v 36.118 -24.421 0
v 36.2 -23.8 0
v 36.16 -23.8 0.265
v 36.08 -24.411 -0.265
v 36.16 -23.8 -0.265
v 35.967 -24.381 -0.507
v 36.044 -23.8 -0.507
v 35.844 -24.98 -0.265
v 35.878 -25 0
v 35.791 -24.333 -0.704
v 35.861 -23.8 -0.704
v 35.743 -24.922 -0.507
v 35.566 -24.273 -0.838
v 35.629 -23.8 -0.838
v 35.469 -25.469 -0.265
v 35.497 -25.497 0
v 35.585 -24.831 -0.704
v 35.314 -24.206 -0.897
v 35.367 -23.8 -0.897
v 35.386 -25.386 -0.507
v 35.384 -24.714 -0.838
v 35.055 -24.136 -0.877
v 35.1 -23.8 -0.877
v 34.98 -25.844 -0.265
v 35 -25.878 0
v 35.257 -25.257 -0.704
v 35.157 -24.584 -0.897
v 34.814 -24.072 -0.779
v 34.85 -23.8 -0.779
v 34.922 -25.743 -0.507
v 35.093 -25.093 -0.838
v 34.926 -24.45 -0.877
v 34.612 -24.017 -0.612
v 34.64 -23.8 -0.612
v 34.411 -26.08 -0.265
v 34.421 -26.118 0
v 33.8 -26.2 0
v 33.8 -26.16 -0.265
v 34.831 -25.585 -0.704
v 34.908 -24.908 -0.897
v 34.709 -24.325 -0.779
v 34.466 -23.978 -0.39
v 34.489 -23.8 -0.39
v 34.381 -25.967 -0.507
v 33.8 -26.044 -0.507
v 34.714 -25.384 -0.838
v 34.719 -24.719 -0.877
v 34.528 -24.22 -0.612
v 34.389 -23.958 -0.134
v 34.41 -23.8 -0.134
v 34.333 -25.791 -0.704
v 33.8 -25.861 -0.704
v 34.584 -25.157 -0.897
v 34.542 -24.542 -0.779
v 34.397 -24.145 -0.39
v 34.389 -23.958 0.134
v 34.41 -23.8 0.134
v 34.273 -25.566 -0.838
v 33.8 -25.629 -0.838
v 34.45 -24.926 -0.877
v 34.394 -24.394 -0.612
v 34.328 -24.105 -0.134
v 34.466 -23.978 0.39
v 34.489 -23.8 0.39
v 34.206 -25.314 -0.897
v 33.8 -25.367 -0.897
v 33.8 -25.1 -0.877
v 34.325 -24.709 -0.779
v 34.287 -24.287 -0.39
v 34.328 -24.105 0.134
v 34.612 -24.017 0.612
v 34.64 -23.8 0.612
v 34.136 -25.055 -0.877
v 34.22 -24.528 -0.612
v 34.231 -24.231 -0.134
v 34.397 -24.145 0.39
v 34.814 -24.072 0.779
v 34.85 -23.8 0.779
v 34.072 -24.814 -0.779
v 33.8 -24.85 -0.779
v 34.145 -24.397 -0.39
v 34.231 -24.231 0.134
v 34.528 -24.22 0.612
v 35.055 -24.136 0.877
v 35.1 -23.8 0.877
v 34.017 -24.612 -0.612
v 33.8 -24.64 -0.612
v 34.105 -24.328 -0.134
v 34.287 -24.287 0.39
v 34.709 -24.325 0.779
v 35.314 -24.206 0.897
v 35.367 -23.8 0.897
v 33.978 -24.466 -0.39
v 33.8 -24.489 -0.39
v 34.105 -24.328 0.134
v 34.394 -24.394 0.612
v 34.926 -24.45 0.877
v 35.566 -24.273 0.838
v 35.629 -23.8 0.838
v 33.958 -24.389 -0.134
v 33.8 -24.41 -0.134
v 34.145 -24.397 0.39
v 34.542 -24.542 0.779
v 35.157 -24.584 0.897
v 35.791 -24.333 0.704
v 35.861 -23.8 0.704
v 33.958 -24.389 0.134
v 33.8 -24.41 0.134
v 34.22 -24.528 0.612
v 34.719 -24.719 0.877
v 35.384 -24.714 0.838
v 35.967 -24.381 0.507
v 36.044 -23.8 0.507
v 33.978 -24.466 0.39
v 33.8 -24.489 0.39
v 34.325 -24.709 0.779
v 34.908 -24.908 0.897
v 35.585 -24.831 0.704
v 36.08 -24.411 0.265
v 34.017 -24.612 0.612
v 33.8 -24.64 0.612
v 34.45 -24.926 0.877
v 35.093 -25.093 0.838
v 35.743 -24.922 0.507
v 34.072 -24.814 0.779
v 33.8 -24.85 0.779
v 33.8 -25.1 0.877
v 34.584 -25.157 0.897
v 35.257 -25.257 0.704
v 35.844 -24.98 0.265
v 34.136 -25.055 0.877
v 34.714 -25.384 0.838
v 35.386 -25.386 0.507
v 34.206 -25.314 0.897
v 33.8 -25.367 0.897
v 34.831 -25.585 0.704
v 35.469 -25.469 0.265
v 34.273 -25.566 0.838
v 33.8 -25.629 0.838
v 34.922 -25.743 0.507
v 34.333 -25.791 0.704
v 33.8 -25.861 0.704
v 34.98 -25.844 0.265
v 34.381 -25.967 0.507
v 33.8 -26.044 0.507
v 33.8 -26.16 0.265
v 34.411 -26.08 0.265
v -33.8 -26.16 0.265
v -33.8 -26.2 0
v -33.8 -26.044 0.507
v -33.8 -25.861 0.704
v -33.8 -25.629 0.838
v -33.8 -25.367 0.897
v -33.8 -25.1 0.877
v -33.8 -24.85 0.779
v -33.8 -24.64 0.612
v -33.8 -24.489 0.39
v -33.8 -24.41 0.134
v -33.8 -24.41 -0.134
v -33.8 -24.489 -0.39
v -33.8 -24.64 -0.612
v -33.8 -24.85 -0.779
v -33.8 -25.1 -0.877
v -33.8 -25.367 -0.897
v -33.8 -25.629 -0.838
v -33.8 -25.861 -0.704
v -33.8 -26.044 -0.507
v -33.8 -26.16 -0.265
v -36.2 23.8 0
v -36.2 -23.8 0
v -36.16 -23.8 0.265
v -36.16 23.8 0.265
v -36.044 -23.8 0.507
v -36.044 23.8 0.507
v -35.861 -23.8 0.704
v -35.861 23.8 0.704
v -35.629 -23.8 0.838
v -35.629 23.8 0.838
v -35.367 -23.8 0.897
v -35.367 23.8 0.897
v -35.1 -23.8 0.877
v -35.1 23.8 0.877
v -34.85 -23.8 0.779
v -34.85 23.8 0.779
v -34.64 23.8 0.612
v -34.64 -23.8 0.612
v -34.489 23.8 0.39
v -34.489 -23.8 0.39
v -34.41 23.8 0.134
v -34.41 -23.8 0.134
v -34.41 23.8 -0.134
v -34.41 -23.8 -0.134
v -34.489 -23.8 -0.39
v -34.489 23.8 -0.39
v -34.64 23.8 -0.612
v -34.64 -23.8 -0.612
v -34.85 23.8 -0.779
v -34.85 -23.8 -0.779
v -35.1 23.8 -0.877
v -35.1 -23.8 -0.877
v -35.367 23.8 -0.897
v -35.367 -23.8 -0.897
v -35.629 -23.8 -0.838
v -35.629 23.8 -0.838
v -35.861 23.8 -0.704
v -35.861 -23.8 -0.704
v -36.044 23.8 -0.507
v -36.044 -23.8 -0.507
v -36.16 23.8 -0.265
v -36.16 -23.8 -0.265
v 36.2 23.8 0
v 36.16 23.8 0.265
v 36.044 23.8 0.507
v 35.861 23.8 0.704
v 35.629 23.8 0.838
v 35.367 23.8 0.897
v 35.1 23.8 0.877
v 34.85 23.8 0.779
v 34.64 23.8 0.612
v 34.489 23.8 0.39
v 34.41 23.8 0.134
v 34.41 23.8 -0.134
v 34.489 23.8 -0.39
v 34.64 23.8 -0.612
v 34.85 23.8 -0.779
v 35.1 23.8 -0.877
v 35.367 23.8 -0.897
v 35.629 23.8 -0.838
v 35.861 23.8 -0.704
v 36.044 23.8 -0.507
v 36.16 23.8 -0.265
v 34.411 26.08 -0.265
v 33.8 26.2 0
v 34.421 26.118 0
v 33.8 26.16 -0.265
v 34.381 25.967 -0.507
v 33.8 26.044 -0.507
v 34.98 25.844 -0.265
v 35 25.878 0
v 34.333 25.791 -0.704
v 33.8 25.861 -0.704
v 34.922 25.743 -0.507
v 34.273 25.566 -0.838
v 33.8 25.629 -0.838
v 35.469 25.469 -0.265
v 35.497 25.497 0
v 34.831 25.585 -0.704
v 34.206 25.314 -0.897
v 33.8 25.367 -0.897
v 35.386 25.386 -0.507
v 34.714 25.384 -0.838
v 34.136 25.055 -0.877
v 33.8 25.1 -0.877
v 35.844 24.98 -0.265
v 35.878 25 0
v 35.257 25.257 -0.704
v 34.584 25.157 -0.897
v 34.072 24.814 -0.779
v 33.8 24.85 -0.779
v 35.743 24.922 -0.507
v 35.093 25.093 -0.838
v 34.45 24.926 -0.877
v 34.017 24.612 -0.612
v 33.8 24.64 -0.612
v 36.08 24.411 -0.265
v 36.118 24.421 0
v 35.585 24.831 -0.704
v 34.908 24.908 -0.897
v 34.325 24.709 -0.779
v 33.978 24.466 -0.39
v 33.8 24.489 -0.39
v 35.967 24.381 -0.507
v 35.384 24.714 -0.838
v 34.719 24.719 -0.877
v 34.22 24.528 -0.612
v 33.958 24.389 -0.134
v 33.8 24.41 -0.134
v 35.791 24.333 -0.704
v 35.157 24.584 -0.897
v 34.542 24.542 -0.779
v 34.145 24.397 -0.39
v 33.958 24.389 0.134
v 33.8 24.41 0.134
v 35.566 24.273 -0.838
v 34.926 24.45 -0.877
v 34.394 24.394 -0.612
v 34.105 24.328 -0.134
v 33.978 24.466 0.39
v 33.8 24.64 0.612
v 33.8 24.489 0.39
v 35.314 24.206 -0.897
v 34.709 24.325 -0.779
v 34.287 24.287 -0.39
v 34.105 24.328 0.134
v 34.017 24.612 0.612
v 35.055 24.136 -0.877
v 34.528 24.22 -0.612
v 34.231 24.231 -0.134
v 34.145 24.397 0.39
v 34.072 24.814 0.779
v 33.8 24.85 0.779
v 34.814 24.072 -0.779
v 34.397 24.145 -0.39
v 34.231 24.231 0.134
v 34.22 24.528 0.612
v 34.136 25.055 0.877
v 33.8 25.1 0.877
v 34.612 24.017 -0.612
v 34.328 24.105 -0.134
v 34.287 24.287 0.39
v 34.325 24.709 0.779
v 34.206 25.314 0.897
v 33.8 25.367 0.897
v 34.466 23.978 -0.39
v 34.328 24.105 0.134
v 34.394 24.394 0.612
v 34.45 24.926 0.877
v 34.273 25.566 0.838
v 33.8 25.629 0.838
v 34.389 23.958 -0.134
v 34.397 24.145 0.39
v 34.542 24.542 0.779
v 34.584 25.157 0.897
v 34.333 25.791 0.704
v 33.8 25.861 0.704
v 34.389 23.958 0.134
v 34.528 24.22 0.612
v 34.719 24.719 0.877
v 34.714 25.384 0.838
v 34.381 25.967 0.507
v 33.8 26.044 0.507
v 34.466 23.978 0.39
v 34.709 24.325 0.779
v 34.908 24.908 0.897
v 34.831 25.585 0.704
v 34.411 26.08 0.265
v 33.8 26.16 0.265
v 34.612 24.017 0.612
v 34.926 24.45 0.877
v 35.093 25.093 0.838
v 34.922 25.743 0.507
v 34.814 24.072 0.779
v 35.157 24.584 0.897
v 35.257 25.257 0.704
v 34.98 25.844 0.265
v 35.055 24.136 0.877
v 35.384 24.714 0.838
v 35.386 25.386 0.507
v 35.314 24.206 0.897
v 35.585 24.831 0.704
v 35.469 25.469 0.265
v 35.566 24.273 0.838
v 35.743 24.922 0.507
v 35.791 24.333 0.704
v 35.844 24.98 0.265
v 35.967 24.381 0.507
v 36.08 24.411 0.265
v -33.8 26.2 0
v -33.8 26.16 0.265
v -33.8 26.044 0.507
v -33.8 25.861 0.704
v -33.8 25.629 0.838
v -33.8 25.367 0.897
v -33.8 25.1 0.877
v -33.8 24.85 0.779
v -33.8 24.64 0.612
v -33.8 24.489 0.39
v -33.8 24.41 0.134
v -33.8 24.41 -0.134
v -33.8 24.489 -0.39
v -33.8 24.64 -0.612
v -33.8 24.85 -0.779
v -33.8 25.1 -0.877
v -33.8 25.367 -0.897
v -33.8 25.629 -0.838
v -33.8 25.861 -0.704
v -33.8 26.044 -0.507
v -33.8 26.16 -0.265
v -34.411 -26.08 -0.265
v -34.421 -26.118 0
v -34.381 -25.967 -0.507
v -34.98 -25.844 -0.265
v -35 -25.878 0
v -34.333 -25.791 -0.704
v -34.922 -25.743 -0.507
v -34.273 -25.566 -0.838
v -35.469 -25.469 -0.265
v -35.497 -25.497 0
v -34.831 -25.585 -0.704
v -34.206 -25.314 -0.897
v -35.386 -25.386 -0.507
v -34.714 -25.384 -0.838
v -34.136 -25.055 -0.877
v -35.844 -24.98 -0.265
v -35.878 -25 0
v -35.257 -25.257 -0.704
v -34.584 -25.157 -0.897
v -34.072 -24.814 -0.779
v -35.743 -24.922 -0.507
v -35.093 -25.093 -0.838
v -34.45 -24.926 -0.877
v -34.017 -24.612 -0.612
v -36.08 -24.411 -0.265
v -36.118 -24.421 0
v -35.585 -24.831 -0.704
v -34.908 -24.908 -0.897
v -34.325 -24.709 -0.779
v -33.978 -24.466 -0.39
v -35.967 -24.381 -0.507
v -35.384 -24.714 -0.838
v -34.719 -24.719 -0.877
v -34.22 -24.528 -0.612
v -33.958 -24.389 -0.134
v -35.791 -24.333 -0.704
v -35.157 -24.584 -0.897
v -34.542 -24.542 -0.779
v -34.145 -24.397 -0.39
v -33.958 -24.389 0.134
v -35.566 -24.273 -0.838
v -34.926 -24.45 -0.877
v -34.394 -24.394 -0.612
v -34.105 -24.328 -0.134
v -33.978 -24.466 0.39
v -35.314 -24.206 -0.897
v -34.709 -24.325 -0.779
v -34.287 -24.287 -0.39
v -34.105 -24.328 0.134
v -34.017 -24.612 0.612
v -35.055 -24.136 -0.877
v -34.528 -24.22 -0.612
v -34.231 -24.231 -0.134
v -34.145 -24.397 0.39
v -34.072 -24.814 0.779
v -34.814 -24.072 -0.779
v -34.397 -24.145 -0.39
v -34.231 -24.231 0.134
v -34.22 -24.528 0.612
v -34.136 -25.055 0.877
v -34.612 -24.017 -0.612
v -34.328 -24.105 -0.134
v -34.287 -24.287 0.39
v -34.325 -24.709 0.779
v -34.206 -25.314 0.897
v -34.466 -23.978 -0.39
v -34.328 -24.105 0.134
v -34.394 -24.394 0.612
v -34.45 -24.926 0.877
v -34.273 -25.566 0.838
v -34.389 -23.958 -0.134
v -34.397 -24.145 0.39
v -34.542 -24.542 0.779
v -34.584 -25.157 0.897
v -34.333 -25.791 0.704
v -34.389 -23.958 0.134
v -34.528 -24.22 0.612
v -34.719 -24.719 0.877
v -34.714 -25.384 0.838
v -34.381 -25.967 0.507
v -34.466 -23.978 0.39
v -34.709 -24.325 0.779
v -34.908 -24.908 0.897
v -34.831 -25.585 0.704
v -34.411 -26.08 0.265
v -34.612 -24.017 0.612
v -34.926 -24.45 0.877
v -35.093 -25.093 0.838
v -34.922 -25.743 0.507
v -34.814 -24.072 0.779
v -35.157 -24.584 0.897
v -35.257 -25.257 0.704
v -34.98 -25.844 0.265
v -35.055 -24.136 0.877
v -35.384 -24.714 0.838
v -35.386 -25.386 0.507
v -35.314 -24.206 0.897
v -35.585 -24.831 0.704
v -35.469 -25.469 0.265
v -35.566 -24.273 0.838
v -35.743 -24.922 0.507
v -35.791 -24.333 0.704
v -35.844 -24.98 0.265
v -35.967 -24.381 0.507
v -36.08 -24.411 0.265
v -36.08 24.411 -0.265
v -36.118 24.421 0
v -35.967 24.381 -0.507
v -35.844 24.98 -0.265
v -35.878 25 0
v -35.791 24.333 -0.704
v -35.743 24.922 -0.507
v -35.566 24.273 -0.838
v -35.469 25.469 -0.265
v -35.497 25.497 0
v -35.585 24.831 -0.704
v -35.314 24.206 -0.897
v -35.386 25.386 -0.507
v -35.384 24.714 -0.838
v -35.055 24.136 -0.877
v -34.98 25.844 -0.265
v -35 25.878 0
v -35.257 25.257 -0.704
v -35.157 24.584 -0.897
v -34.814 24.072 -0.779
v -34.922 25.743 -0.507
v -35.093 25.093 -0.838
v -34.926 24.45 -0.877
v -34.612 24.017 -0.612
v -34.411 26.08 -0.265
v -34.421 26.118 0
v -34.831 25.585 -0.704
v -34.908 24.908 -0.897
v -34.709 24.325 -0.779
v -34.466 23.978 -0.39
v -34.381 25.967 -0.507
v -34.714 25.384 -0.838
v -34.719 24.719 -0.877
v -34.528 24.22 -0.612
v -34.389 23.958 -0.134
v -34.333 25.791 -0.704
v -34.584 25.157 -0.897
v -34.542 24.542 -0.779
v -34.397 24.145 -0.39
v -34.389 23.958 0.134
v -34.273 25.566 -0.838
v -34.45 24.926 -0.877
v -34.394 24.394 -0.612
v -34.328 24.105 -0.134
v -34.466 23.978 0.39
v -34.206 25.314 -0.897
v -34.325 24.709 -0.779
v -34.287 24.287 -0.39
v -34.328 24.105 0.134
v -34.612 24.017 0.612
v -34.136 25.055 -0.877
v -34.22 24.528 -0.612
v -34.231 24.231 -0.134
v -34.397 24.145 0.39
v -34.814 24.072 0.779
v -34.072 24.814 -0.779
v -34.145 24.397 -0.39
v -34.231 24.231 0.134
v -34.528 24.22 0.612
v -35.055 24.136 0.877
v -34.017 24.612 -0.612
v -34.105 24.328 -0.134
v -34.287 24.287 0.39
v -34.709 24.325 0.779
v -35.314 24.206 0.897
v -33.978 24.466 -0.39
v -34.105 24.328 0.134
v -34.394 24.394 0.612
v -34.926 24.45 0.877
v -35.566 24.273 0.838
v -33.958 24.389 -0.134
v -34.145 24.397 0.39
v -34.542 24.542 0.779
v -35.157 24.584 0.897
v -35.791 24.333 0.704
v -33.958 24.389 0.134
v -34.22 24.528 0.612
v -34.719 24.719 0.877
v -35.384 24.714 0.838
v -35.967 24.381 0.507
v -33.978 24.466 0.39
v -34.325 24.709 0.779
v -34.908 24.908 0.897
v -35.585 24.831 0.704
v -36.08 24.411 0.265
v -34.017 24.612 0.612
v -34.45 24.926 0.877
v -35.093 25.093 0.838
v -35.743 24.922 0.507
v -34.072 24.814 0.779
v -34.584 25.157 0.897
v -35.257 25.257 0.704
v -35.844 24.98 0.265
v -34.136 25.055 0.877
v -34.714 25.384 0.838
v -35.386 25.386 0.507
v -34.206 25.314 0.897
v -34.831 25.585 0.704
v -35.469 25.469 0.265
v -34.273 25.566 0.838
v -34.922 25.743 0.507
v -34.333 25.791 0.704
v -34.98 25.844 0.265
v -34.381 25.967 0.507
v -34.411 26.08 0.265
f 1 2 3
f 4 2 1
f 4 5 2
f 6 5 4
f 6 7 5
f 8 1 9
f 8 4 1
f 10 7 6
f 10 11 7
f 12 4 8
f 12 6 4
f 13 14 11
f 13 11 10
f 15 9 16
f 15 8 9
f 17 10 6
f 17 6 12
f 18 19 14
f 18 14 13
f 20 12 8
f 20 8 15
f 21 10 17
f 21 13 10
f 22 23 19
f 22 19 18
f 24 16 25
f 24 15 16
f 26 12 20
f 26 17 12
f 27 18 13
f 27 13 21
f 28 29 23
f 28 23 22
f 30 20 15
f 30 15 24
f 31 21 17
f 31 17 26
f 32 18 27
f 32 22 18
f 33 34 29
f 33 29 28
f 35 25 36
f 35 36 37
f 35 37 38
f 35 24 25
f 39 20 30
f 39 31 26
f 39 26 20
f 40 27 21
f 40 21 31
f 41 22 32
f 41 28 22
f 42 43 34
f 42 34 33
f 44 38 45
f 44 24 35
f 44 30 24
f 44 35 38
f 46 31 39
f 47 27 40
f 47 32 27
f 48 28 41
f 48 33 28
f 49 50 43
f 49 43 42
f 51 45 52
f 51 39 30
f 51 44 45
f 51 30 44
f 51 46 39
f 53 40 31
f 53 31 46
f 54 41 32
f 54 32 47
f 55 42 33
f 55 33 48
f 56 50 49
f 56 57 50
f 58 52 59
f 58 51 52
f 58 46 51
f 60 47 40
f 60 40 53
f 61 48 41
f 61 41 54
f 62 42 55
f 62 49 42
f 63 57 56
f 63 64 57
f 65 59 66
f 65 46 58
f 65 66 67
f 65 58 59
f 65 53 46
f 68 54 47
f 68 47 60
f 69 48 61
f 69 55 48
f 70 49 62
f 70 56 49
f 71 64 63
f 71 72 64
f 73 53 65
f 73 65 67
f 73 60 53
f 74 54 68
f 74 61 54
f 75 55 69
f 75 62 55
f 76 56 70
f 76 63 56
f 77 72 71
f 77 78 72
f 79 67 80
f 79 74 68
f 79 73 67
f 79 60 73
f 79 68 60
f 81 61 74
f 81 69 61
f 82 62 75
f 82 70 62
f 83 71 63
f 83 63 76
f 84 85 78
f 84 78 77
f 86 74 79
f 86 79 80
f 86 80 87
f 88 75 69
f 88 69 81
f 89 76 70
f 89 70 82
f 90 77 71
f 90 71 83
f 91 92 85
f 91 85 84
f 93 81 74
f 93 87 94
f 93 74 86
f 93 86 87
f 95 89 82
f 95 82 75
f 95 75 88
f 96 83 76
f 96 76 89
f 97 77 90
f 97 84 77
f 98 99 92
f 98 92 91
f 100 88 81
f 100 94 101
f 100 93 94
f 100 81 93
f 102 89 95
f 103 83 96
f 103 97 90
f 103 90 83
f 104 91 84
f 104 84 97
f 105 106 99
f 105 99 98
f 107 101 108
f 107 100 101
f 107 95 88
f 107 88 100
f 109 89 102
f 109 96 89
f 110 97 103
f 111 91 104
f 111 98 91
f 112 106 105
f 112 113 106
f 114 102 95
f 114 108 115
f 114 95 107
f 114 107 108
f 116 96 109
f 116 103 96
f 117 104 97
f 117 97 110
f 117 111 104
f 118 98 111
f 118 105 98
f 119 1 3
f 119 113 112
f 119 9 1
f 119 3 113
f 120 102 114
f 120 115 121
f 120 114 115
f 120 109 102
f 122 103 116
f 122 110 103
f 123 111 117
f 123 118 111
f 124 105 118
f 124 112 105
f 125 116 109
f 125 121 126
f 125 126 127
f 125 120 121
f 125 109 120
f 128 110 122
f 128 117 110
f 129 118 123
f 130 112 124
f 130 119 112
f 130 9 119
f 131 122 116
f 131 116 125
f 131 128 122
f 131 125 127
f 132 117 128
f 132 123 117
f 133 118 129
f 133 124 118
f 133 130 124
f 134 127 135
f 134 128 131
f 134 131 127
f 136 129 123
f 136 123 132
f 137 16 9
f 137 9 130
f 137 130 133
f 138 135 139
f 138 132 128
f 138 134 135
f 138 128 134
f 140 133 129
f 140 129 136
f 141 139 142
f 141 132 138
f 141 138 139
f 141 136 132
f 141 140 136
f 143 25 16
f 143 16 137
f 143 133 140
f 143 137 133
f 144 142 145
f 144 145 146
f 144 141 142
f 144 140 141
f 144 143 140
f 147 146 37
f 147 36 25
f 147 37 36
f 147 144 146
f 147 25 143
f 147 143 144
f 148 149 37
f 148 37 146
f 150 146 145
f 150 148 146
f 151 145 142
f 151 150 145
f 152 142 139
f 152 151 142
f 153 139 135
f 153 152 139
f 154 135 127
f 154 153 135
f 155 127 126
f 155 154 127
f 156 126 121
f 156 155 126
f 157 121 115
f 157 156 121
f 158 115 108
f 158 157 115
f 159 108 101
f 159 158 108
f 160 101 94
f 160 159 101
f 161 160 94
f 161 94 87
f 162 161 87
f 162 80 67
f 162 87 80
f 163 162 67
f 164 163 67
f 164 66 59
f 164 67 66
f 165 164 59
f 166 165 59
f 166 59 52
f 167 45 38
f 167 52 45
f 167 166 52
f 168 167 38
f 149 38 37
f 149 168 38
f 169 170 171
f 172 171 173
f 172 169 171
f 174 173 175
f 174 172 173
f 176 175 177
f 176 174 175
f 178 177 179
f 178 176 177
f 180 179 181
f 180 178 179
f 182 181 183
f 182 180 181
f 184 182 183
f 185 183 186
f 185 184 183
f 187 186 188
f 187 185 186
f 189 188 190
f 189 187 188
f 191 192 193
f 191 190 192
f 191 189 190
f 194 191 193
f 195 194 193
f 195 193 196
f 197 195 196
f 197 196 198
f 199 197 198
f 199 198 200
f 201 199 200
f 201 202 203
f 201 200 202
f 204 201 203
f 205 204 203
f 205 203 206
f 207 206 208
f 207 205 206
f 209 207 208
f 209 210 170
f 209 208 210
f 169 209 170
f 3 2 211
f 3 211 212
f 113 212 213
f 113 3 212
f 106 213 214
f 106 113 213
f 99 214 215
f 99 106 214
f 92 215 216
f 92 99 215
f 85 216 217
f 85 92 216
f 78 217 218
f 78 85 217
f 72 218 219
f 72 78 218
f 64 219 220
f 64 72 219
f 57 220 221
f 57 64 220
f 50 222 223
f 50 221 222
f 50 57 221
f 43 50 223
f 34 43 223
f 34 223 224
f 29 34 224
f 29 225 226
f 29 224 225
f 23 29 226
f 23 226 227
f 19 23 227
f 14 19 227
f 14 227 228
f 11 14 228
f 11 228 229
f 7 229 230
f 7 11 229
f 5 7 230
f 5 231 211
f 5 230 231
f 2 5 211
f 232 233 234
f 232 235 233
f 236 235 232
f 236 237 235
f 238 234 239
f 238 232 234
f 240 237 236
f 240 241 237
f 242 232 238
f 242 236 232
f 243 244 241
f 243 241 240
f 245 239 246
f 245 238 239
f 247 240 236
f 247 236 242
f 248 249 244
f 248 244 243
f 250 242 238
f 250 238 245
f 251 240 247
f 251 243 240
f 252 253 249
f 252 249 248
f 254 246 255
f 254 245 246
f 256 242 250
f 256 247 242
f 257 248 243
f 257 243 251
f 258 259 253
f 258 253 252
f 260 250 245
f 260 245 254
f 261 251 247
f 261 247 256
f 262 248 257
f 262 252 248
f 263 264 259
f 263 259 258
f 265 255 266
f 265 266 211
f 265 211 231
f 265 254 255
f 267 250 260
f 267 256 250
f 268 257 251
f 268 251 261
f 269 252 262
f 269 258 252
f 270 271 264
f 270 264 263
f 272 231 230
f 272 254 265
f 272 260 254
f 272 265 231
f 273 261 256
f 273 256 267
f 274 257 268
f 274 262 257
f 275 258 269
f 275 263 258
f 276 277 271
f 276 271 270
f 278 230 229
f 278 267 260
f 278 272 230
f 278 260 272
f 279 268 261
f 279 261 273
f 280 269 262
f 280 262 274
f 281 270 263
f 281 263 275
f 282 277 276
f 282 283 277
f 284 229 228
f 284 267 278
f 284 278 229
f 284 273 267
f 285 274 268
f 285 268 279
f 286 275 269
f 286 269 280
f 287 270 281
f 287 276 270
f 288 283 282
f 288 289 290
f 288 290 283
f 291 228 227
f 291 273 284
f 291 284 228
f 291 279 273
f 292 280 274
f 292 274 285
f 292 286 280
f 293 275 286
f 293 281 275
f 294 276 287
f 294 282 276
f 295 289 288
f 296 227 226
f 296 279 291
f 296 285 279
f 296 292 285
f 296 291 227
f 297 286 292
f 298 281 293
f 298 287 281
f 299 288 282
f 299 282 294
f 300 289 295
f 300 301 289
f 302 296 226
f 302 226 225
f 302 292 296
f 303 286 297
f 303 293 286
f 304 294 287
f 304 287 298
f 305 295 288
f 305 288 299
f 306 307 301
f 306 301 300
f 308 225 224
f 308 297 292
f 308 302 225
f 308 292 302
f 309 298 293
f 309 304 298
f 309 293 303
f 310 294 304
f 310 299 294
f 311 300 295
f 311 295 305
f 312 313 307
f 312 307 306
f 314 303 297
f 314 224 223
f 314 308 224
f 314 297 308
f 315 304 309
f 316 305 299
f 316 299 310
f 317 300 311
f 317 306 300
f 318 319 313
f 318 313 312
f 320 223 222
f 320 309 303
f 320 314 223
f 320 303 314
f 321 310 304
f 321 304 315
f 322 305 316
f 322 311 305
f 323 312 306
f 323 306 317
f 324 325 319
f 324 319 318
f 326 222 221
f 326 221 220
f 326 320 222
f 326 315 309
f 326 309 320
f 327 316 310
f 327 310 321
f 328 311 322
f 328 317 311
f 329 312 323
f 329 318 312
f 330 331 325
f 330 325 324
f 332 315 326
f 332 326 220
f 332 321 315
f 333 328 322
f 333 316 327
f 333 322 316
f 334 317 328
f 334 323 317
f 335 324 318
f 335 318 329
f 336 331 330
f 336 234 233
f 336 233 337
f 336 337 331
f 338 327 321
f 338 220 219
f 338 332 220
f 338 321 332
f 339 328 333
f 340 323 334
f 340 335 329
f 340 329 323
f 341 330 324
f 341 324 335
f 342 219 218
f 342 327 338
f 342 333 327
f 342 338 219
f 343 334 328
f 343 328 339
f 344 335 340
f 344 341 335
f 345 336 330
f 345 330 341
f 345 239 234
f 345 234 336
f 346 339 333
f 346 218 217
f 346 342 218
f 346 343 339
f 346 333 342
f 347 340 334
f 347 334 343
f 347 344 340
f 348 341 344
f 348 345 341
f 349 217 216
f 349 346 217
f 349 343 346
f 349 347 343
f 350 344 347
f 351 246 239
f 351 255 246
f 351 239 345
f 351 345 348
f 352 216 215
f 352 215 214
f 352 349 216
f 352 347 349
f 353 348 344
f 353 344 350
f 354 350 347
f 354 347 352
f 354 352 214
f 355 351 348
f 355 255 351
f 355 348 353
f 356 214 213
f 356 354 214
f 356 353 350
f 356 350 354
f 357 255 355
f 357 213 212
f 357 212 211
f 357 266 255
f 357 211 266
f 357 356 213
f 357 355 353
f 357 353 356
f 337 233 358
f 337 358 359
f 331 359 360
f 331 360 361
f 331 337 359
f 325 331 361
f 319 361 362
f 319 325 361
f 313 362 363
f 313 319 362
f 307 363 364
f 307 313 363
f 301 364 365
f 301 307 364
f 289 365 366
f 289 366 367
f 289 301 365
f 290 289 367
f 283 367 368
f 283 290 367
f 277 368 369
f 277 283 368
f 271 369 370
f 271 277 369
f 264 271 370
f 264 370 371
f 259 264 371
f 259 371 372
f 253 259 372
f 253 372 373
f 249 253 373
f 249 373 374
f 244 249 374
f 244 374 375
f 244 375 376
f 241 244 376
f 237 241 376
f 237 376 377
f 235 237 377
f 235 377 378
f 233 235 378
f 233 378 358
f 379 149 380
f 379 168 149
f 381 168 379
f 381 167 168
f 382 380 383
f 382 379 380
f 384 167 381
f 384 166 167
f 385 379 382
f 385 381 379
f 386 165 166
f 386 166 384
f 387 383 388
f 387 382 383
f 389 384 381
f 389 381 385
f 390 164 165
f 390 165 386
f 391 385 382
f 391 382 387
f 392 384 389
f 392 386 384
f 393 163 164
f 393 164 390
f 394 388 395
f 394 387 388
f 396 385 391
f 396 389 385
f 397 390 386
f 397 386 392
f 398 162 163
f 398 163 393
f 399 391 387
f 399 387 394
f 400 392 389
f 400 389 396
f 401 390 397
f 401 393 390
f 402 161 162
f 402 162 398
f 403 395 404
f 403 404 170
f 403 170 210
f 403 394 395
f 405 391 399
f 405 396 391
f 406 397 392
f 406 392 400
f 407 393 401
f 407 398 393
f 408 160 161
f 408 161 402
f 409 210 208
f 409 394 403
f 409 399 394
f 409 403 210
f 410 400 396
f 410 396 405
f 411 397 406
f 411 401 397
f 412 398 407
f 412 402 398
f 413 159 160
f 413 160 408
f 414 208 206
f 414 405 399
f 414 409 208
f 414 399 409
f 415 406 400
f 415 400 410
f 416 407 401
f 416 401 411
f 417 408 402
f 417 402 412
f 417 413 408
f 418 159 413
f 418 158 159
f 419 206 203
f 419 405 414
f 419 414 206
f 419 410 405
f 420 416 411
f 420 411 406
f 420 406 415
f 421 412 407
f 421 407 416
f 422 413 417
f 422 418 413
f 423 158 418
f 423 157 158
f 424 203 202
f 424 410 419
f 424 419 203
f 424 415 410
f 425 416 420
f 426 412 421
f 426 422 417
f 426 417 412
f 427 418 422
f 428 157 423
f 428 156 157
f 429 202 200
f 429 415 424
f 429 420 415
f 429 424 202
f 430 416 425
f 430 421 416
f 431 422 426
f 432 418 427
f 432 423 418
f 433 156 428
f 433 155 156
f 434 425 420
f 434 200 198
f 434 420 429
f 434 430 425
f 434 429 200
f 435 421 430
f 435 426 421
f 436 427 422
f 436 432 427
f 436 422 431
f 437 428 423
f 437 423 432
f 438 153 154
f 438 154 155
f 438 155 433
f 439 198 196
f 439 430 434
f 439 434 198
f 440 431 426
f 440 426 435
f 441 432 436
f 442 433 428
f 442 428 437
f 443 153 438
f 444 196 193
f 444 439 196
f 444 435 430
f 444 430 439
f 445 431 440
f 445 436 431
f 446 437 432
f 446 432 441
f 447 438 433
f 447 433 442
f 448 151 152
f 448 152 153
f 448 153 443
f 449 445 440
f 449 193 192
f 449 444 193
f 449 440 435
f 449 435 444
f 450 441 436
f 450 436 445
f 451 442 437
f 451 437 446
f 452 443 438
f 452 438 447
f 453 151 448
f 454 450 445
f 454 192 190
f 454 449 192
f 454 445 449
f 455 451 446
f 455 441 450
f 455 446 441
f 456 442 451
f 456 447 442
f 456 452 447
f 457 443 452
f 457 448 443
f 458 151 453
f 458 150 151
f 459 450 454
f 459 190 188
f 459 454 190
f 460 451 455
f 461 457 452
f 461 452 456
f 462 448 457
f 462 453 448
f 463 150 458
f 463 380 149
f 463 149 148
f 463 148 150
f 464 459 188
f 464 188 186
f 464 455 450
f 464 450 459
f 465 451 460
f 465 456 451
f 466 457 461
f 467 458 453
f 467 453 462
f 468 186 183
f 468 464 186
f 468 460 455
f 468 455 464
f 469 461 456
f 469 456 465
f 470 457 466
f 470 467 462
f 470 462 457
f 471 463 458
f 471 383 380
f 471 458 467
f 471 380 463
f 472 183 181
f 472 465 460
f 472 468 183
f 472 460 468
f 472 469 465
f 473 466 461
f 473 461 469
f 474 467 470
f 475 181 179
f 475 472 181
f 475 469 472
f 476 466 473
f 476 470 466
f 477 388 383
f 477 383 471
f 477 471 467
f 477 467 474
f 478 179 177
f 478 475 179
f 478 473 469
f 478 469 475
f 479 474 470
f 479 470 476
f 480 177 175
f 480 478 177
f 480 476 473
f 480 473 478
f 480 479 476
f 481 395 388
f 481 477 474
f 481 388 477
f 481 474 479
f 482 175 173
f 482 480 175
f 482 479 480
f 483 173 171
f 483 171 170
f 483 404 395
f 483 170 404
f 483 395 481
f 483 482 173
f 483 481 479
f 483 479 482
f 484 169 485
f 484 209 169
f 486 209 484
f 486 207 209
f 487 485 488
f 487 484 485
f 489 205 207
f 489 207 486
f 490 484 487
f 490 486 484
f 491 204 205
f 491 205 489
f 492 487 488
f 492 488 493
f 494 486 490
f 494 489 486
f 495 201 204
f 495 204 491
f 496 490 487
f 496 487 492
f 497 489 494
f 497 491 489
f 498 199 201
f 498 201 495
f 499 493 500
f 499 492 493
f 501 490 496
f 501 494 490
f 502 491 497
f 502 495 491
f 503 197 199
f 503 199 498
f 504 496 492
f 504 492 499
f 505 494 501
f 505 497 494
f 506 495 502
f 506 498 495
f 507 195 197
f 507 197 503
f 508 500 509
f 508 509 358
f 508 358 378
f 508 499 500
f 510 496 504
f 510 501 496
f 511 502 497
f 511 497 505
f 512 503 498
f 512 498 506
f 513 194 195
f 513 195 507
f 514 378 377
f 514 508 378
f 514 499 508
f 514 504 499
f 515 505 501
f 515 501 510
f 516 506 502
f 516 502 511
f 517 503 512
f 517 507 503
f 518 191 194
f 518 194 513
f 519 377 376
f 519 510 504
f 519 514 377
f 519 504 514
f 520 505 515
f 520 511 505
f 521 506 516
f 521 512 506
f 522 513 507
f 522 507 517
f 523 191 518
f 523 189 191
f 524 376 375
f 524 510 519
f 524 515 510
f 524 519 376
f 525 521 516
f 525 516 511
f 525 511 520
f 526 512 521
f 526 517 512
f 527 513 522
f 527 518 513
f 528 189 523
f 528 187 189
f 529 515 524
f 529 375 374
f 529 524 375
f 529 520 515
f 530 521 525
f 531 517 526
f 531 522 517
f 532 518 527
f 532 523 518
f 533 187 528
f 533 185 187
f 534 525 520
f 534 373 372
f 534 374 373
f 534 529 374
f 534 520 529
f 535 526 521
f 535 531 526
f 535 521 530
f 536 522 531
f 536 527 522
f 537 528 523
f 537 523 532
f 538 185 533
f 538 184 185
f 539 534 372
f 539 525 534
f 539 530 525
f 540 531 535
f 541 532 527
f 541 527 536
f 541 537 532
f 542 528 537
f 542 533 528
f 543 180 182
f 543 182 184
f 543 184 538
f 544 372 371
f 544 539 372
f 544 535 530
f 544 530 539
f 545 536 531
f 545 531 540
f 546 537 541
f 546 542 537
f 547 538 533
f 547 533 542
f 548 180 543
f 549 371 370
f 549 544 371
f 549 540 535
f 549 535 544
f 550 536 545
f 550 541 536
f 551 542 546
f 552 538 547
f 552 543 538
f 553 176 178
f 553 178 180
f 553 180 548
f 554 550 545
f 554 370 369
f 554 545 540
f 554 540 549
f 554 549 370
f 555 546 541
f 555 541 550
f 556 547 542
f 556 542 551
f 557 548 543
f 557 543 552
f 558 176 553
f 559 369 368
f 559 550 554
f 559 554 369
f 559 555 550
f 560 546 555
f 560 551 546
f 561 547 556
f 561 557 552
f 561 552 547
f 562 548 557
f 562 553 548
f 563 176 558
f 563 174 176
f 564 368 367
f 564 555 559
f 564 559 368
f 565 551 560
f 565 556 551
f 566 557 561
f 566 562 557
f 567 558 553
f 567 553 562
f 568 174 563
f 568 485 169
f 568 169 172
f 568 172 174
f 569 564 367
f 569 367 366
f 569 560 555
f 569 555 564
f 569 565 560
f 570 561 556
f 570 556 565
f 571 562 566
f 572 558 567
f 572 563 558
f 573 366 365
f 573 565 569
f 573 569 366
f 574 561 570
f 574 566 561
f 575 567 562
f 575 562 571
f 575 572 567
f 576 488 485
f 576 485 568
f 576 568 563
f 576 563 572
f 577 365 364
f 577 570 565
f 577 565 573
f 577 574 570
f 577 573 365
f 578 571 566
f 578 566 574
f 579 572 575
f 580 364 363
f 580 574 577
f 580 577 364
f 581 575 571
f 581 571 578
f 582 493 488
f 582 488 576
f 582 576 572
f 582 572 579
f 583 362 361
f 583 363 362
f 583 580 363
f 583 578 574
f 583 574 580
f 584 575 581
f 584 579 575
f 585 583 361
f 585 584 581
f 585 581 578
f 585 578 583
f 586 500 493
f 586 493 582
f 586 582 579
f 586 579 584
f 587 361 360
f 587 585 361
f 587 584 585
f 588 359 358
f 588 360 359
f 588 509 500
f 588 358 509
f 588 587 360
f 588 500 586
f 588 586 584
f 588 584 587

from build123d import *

# Parameters (mm, degrees)
SKETCH_2_R = 0.9


with BuildPart() as part:
    # По траектории1: sweep along a path in Эскиз1
    with BuildLine(Plane.XY) as sweep_1_path:
        Line((-33.8, 25.3), (33.8, 25.3))
        ThreePointArc((33.8, 25.3), (34.860660172, 24.860660172), (35.3, 23.8))
        Line((35.3, 23.8), (35.3, -23.8))
        ThreePointArc((35.3, -23.8), (34.860660172, -24.860660172), (33.8, -25.3))
        Line((33.8, -25.3), (-33.8, -25.3))
        ThreePointArc((-33.8, -25.3), (-34.860660172, -24.860660172), (-35.3, -23.8))
        Line((-35.3, -23.8), (-35.3, 23.8))
        ThreePointArc((-35.3, 23.8), (-34.860660172, 24.860660172), (-33.8, 25.3))
    # Эскиз2 → По траектории1 (sweep)
    with BuildSketch(Plane(origin=(0, 0, 0), x_dir=(-1, 0, 0), z_dir=(0, -1, 0))):
        with Locations((35.3, 0)):
            Circle(SKETCH_2_R)
    sweep(path=sweep_1_path.line)


solid = part.part
